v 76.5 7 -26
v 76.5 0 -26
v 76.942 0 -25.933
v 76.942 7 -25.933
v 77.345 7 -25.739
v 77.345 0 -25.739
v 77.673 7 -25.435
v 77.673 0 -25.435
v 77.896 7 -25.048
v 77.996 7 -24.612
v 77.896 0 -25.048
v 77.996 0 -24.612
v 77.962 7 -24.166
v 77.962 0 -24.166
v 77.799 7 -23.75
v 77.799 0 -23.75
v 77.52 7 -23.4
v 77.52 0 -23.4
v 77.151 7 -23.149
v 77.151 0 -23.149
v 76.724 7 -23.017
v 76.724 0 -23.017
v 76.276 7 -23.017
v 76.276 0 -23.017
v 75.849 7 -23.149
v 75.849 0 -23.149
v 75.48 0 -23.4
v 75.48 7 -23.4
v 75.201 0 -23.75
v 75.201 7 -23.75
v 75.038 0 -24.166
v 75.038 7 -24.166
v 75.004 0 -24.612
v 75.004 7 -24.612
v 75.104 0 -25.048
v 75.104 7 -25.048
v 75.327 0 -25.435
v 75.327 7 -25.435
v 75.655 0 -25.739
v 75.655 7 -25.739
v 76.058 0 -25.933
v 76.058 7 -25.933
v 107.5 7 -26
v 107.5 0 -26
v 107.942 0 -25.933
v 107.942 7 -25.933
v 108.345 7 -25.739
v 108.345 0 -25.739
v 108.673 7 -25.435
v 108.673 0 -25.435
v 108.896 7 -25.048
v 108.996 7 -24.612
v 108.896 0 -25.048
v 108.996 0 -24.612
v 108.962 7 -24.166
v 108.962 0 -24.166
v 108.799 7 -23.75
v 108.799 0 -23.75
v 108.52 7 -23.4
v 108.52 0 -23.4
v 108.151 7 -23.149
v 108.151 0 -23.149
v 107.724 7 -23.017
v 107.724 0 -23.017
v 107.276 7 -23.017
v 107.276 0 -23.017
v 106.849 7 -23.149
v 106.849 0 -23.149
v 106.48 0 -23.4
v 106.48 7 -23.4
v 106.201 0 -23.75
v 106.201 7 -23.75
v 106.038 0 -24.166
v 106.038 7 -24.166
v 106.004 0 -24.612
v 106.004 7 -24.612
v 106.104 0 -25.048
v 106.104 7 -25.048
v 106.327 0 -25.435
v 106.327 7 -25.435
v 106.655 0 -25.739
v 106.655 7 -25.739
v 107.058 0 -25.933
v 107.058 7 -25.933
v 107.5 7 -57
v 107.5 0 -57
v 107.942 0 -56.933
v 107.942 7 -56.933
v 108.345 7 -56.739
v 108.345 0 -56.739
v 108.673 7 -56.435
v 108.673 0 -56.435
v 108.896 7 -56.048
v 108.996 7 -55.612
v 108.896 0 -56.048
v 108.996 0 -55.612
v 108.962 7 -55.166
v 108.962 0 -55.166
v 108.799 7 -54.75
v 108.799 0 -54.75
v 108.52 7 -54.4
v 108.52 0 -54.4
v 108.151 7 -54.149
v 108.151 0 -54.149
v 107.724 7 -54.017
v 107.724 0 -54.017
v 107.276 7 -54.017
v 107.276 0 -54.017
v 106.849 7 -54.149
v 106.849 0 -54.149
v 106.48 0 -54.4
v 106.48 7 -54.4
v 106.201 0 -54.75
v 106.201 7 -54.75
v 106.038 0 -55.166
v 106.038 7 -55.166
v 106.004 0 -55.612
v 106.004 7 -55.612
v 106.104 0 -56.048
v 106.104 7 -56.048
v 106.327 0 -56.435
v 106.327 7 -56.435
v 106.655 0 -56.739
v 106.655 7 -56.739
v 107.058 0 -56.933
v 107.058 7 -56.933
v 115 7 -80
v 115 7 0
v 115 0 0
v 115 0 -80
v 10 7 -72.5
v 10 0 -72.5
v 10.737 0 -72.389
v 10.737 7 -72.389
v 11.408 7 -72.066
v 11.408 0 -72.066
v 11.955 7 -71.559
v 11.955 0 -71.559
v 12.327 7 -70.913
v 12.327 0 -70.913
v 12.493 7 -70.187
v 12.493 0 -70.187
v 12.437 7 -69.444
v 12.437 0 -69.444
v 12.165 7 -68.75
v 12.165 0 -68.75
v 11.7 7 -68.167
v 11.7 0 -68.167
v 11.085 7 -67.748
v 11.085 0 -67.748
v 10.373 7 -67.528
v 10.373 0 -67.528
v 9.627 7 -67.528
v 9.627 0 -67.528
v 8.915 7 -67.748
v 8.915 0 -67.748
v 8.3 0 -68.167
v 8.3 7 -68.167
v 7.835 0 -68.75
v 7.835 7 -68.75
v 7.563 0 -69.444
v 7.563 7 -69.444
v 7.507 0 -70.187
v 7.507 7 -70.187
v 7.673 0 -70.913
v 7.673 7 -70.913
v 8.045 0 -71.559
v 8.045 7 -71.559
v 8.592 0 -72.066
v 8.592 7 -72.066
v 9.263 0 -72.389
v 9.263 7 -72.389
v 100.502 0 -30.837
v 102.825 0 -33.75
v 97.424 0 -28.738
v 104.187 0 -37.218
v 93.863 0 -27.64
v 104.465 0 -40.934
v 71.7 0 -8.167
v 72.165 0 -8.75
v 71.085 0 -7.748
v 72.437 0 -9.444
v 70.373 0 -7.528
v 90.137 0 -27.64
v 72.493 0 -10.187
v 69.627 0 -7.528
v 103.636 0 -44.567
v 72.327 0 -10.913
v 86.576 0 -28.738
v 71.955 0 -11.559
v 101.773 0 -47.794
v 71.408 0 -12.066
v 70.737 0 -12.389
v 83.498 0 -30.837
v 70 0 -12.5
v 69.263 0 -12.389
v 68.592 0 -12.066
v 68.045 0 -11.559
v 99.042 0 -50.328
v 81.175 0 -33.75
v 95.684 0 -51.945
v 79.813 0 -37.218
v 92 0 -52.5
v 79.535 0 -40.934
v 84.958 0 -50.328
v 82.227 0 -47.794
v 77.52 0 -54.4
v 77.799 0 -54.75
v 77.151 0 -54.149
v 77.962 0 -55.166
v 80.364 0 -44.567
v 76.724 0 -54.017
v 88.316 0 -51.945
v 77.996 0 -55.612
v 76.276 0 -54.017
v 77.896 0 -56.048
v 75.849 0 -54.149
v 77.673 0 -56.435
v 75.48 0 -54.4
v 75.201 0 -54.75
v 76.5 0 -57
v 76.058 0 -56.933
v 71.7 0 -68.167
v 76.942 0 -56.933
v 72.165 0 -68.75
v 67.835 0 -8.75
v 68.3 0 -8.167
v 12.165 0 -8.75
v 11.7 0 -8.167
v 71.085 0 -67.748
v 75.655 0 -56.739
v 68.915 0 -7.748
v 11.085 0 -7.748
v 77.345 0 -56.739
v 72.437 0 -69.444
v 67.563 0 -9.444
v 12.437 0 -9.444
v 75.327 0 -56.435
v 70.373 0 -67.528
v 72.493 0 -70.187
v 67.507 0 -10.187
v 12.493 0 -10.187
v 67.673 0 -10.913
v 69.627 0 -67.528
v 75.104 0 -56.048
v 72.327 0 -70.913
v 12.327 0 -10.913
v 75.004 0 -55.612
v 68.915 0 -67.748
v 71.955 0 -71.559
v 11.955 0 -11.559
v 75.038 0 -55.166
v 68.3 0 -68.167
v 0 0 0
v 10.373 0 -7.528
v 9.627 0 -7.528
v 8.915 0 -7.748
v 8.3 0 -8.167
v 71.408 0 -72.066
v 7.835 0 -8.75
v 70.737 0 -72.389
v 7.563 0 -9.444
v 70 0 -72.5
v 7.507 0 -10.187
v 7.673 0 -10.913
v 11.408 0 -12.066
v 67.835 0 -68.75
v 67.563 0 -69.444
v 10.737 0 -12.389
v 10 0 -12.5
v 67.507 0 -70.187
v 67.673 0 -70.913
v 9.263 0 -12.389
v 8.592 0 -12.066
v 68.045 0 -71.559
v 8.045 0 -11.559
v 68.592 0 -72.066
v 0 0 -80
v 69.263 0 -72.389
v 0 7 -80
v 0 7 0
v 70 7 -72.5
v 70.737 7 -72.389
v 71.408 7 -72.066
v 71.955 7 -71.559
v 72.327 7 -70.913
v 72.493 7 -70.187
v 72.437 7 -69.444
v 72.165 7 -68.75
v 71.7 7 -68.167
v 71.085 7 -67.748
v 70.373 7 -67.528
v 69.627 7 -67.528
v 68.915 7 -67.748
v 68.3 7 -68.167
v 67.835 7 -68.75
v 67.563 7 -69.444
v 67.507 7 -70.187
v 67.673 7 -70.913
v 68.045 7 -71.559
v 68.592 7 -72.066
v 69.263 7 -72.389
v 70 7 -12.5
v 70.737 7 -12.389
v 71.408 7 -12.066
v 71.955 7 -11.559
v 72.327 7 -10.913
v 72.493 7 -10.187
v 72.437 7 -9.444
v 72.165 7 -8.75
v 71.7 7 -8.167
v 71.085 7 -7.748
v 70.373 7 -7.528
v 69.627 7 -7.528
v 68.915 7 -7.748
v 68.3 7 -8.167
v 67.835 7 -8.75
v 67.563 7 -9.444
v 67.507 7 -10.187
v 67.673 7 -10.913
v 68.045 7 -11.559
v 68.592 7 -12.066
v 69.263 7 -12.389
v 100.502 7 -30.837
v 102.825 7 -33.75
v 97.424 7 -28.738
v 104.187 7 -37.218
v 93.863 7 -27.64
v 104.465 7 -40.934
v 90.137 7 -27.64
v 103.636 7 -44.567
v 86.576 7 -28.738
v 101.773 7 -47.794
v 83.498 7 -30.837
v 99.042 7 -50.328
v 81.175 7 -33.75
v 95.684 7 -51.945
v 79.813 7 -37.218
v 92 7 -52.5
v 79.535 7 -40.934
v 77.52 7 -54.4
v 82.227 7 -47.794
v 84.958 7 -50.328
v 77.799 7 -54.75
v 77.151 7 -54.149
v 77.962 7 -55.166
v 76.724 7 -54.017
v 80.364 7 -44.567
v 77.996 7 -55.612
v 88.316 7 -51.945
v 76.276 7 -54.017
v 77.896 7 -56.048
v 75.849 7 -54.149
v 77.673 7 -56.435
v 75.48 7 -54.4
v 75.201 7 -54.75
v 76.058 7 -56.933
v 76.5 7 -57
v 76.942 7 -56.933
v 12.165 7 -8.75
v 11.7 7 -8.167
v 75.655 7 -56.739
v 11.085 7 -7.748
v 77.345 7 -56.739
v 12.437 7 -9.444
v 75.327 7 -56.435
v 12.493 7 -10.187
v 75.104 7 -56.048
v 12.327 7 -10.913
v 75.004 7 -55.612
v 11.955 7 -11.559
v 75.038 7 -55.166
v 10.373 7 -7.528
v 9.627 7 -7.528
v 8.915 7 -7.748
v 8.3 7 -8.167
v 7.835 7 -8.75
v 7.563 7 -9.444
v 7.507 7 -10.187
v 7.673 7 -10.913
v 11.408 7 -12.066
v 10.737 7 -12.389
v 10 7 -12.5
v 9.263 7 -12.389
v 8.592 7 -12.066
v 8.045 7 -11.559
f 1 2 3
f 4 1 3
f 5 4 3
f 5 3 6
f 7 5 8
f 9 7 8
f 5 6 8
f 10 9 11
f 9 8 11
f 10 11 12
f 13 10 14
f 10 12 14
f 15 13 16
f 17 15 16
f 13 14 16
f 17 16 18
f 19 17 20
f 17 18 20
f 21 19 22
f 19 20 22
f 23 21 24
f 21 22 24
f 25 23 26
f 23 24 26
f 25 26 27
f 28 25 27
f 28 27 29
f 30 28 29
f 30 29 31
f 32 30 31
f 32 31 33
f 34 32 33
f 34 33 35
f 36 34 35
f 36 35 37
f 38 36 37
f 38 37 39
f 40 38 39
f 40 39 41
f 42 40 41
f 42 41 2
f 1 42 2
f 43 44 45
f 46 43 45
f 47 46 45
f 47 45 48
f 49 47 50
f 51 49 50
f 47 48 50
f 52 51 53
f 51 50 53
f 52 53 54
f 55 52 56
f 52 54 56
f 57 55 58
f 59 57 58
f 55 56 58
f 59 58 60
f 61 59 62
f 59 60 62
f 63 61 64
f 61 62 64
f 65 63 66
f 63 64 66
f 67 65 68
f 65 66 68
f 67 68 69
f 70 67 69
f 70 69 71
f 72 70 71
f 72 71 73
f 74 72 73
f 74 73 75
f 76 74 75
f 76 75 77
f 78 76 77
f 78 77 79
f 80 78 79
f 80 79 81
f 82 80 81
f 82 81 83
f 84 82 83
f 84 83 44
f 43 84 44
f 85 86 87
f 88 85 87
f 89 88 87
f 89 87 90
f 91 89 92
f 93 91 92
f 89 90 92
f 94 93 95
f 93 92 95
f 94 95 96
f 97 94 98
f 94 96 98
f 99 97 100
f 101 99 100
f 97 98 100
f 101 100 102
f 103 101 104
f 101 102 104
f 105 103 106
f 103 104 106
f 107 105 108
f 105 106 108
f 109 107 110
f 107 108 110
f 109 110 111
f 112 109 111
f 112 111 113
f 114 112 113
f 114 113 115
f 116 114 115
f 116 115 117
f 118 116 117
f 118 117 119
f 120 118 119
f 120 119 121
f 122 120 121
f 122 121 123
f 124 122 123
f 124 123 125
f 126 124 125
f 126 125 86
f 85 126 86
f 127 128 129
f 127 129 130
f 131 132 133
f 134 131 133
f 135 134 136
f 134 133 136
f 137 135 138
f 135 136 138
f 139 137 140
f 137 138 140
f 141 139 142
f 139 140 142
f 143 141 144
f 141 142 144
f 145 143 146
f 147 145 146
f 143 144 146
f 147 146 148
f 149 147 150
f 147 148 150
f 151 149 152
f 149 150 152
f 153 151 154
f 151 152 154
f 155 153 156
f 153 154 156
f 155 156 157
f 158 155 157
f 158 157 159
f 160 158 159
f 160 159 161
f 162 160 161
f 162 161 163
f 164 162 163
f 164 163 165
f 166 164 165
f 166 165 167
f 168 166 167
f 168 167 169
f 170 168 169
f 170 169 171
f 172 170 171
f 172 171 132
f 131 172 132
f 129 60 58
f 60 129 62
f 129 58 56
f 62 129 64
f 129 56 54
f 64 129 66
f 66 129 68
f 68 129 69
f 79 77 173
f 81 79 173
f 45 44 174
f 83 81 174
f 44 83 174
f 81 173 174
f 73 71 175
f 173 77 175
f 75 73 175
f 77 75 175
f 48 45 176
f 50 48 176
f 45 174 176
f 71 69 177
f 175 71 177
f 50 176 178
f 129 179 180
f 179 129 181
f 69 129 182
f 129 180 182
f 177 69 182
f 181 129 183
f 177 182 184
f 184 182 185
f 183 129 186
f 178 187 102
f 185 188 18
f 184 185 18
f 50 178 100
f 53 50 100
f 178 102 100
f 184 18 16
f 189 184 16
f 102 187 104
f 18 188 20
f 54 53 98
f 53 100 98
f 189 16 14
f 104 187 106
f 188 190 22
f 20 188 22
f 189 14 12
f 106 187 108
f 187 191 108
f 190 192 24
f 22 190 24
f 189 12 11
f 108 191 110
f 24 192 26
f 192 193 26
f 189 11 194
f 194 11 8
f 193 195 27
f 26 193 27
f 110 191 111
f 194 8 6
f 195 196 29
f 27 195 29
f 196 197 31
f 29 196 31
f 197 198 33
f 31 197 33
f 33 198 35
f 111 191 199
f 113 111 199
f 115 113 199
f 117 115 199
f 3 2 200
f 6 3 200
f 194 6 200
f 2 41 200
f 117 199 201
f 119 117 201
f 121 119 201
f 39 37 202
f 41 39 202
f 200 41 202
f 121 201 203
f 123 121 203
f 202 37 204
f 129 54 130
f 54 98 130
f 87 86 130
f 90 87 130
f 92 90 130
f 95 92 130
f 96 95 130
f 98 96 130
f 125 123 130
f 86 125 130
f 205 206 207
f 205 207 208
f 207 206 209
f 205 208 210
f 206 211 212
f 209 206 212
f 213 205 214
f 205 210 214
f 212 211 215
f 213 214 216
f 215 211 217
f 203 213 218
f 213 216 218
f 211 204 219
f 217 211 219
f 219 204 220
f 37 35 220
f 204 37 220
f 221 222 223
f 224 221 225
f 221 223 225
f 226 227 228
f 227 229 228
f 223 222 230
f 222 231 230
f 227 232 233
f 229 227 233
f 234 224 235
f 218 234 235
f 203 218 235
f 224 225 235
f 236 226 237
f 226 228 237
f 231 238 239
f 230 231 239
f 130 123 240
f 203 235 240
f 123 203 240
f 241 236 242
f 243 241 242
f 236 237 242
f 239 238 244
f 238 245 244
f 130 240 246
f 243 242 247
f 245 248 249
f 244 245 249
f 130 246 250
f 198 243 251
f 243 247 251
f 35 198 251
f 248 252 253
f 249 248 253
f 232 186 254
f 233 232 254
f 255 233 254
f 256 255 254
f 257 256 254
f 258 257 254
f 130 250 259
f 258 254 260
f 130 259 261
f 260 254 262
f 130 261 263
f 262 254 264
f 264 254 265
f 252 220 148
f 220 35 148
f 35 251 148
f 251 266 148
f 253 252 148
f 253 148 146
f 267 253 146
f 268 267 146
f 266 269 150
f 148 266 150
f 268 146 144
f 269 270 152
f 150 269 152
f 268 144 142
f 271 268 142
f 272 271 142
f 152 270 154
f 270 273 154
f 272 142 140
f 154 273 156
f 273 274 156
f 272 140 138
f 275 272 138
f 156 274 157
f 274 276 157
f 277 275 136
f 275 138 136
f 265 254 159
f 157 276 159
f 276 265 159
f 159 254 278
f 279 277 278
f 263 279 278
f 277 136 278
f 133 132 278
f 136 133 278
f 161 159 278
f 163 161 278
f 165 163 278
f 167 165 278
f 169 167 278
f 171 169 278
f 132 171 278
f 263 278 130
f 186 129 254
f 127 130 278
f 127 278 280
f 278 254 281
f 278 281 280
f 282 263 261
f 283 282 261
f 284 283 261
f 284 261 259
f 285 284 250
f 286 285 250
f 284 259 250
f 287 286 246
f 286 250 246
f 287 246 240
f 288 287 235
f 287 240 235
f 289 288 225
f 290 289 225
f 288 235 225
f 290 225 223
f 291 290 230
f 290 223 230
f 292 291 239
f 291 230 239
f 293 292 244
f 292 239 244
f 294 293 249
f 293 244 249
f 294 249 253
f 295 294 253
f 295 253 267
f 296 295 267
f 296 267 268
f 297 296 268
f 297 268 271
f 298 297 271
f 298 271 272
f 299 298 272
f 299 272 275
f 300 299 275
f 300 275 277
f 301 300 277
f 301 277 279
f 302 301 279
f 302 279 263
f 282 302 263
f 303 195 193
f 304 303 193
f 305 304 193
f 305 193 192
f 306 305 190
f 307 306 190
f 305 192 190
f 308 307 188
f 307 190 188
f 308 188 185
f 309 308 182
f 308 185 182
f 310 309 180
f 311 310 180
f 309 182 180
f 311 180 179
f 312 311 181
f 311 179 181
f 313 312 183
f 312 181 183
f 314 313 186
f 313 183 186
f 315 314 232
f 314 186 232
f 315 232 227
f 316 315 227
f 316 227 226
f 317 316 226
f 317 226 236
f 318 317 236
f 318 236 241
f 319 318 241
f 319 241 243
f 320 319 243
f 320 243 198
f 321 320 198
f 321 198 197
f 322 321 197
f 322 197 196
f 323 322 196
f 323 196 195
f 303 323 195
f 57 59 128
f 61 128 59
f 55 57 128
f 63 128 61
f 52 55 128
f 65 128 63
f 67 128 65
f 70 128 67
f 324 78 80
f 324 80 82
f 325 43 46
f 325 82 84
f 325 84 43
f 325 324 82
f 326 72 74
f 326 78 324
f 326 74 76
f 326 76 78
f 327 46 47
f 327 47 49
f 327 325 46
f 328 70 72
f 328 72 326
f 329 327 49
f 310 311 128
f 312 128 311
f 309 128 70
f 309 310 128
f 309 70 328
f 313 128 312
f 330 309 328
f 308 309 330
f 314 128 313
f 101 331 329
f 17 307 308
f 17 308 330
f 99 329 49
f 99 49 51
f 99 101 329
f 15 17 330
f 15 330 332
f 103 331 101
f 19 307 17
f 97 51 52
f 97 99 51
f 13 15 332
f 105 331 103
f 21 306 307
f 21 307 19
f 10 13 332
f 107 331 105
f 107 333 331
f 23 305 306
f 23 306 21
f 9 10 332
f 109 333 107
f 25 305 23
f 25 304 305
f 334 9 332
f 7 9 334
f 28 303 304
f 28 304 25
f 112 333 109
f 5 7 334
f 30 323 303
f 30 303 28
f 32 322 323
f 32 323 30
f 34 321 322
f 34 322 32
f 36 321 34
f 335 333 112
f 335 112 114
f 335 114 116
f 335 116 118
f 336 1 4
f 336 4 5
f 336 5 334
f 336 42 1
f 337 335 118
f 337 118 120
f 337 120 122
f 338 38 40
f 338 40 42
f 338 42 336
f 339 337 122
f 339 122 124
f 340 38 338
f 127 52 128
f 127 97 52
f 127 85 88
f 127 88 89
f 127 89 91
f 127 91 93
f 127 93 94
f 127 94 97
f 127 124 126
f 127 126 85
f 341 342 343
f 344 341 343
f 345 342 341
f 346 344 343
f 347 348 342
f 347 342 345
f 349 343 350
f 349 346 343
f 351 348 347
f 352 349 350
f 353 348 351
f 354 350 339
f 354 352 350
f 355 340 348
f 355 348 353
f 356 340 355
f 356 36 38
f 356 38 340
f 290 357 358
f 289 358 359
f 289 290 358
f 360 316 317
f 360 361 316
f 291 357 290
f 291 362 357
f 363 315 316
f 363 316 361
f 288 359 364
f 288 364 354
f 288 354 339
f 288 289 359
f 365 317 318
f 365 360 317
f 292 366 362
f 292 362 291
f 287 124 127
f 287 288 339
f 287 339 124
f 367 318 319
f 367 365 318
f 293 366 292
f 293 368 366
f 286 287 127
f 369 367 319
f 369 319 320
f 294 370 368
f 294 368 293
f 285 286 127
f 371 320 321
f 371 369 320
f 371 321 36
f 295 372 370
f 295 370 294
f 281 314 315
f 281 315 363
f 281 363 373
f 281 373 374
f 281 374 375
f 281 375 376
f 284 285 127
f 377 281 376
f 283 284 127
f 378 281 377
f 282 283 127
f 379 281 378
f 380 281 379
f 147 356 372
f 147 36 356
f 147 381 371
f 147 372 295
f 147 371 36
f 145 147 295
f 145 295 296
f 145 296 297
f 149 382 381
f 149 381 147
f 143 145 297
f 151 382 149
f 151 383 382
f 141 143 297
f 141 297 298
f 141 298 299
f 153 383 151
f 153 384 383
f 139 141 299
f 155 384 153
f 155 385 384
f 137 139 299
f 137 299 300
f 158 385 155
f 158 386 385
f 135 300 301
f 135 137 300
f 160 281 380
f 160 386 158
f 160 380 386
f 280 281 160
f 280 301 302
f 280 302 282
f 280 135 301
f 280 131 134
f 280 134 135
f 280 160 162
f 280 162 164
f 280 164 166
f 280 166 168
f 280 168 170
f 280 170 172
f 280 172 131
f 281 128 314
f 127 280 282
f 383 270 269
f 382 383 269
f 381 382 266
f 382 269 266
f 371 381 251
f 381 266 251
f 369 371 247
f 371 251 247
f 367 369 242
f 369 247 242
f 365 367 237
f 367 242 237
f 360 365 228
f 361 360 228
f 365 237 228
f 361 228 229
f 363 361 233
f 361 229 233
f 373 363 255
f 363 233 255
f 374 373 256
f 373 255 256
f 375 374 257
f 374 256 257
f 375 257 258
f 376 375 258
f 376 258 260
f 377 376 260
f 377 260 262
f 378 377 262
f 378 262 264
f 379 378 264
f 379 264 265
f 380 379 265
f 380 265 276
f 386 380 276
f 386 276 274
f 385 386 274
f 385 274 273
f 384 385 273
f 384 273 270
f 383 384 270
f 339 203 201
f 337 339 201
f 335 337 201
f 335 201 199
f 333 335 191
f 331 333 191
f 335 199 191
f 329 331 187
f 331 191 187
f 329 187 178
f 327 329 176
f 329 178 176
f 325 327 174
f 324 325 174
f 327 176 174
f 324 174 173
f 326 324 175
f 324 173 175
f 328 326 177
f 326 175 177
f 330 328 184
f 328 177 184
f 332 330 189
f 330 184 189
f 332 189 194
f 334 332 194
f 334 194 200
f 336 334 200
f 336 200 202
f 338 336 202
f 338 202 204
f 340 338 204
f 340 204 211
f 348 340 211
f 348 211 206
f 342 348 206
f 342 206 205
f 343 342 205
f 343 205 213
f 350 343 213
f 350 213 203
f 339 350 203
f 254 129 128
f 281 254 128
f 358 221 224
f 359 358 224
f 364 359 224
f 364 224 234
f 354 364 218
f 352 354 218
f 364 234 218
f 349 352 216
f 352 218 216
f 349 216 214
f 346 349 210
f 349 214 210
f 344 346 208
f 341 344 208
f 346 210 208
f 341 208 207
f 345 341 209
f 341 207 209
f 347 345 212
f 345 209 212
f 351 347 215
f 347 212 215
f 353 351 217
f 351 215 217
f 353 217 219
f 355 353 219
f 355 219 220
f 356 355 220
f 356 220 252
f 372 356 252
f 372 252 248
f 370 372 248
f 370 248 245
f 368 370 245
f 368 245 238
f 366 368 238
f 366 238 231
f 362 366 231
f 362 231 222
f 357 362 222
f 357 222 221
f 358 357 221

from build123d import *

# Parameters (mm, degrees)
SKETCH1_W           = 80
SKETCH1_H           = 80
BOSS_EXTRUDE1_DEPTH = 7
SKETCH2_R           = 2.5
CUT_EXTRUDE1_DEPTH  = 10
SKETCH4_W           = 80
SKETCH4_H           = 7
BOSS_EXTRUDE2_DEPTH = 35
SKETCH3_R           = 1.5
SKETCH3_R_2         = 12.5
CUT_EXTRUDE2_DEPTH  = 10


with BuildPart() as part:
    # Sketch1 → Boss-Extrude1 (new body)
    with BuildSketch(Plane(origin=(0, 0, 0), x_dir=(1, 0, 0), z_dir=(0, 1, 0))):
        with Locations((40, 40)):
            Rectangle(SKETCH1_W, SKETCH1_H)
    extrude(amount=BOSS_EXTRUDE1_DEPTH)

    # Sketch2 → Cut-Extrude1 (cut)
    with BuildSketch(Plane.XZ):
        with Locations(Location((70, -70, 0), (0, 0, 270))):
            Circle(SKETCH2_R)
        with Locations(Location((70, -10, 0), (0, 0, 270))):
            Circle(SKETCH2_R)
        with Locations(Location((10, -10, 0), (0, 0, 270))):
            Circle(SKETCH2_R)
        with Locations(Location((10, -70, 0), (0, 0, 270))):
            Circle(SKETCH2_R)
    extrude(amount=-CUT_EXTRUDE1_DEPTH, mode=Mode.SUBTRACT)

    # Sketch4 → Boss-Extrude2 (add)
    with BuildSketch(Plane(origin=(80, 0, 0), x_dir=(0, 0, -1), z_dir=(1, 0, 0))):
        with Locations((40, 3.5)):
            Rectangle(SKETCH4_W, SKETCH4_H)
    extrude(amount=BOSS_EXTRUDE2_DEPTH)

    # Sketch3 → Cut-Extrude2 (cut)
    with BuildSketch(Plane.XZ):
        with Locations(Location((107.5, -24.5, 0), (0, 0, 270))):
            Circle(SKETCH3_R)
        with Locations(Location((107.5, -55.5, 0), (0, 0, 270))):
            Circle(SKETCH3_R)
        with Locations(Location((76.5, -55.5, 0), (0, 0, 270))):
            Circle(SKETCH3_R)
        with Locations(Location((76.5, -24.5, 0), (0, 0, 270))):
            Circle(SKETCH3_R)
        with Locations(Location((92, -40, 0), (0, 0, 270))):
            Circle(SKETCH3_R_2)
    extrude(amount=-CUT_EXTRUDE2_DEPTH, mode=Mode.SUBTRACT)


solid = part.part
